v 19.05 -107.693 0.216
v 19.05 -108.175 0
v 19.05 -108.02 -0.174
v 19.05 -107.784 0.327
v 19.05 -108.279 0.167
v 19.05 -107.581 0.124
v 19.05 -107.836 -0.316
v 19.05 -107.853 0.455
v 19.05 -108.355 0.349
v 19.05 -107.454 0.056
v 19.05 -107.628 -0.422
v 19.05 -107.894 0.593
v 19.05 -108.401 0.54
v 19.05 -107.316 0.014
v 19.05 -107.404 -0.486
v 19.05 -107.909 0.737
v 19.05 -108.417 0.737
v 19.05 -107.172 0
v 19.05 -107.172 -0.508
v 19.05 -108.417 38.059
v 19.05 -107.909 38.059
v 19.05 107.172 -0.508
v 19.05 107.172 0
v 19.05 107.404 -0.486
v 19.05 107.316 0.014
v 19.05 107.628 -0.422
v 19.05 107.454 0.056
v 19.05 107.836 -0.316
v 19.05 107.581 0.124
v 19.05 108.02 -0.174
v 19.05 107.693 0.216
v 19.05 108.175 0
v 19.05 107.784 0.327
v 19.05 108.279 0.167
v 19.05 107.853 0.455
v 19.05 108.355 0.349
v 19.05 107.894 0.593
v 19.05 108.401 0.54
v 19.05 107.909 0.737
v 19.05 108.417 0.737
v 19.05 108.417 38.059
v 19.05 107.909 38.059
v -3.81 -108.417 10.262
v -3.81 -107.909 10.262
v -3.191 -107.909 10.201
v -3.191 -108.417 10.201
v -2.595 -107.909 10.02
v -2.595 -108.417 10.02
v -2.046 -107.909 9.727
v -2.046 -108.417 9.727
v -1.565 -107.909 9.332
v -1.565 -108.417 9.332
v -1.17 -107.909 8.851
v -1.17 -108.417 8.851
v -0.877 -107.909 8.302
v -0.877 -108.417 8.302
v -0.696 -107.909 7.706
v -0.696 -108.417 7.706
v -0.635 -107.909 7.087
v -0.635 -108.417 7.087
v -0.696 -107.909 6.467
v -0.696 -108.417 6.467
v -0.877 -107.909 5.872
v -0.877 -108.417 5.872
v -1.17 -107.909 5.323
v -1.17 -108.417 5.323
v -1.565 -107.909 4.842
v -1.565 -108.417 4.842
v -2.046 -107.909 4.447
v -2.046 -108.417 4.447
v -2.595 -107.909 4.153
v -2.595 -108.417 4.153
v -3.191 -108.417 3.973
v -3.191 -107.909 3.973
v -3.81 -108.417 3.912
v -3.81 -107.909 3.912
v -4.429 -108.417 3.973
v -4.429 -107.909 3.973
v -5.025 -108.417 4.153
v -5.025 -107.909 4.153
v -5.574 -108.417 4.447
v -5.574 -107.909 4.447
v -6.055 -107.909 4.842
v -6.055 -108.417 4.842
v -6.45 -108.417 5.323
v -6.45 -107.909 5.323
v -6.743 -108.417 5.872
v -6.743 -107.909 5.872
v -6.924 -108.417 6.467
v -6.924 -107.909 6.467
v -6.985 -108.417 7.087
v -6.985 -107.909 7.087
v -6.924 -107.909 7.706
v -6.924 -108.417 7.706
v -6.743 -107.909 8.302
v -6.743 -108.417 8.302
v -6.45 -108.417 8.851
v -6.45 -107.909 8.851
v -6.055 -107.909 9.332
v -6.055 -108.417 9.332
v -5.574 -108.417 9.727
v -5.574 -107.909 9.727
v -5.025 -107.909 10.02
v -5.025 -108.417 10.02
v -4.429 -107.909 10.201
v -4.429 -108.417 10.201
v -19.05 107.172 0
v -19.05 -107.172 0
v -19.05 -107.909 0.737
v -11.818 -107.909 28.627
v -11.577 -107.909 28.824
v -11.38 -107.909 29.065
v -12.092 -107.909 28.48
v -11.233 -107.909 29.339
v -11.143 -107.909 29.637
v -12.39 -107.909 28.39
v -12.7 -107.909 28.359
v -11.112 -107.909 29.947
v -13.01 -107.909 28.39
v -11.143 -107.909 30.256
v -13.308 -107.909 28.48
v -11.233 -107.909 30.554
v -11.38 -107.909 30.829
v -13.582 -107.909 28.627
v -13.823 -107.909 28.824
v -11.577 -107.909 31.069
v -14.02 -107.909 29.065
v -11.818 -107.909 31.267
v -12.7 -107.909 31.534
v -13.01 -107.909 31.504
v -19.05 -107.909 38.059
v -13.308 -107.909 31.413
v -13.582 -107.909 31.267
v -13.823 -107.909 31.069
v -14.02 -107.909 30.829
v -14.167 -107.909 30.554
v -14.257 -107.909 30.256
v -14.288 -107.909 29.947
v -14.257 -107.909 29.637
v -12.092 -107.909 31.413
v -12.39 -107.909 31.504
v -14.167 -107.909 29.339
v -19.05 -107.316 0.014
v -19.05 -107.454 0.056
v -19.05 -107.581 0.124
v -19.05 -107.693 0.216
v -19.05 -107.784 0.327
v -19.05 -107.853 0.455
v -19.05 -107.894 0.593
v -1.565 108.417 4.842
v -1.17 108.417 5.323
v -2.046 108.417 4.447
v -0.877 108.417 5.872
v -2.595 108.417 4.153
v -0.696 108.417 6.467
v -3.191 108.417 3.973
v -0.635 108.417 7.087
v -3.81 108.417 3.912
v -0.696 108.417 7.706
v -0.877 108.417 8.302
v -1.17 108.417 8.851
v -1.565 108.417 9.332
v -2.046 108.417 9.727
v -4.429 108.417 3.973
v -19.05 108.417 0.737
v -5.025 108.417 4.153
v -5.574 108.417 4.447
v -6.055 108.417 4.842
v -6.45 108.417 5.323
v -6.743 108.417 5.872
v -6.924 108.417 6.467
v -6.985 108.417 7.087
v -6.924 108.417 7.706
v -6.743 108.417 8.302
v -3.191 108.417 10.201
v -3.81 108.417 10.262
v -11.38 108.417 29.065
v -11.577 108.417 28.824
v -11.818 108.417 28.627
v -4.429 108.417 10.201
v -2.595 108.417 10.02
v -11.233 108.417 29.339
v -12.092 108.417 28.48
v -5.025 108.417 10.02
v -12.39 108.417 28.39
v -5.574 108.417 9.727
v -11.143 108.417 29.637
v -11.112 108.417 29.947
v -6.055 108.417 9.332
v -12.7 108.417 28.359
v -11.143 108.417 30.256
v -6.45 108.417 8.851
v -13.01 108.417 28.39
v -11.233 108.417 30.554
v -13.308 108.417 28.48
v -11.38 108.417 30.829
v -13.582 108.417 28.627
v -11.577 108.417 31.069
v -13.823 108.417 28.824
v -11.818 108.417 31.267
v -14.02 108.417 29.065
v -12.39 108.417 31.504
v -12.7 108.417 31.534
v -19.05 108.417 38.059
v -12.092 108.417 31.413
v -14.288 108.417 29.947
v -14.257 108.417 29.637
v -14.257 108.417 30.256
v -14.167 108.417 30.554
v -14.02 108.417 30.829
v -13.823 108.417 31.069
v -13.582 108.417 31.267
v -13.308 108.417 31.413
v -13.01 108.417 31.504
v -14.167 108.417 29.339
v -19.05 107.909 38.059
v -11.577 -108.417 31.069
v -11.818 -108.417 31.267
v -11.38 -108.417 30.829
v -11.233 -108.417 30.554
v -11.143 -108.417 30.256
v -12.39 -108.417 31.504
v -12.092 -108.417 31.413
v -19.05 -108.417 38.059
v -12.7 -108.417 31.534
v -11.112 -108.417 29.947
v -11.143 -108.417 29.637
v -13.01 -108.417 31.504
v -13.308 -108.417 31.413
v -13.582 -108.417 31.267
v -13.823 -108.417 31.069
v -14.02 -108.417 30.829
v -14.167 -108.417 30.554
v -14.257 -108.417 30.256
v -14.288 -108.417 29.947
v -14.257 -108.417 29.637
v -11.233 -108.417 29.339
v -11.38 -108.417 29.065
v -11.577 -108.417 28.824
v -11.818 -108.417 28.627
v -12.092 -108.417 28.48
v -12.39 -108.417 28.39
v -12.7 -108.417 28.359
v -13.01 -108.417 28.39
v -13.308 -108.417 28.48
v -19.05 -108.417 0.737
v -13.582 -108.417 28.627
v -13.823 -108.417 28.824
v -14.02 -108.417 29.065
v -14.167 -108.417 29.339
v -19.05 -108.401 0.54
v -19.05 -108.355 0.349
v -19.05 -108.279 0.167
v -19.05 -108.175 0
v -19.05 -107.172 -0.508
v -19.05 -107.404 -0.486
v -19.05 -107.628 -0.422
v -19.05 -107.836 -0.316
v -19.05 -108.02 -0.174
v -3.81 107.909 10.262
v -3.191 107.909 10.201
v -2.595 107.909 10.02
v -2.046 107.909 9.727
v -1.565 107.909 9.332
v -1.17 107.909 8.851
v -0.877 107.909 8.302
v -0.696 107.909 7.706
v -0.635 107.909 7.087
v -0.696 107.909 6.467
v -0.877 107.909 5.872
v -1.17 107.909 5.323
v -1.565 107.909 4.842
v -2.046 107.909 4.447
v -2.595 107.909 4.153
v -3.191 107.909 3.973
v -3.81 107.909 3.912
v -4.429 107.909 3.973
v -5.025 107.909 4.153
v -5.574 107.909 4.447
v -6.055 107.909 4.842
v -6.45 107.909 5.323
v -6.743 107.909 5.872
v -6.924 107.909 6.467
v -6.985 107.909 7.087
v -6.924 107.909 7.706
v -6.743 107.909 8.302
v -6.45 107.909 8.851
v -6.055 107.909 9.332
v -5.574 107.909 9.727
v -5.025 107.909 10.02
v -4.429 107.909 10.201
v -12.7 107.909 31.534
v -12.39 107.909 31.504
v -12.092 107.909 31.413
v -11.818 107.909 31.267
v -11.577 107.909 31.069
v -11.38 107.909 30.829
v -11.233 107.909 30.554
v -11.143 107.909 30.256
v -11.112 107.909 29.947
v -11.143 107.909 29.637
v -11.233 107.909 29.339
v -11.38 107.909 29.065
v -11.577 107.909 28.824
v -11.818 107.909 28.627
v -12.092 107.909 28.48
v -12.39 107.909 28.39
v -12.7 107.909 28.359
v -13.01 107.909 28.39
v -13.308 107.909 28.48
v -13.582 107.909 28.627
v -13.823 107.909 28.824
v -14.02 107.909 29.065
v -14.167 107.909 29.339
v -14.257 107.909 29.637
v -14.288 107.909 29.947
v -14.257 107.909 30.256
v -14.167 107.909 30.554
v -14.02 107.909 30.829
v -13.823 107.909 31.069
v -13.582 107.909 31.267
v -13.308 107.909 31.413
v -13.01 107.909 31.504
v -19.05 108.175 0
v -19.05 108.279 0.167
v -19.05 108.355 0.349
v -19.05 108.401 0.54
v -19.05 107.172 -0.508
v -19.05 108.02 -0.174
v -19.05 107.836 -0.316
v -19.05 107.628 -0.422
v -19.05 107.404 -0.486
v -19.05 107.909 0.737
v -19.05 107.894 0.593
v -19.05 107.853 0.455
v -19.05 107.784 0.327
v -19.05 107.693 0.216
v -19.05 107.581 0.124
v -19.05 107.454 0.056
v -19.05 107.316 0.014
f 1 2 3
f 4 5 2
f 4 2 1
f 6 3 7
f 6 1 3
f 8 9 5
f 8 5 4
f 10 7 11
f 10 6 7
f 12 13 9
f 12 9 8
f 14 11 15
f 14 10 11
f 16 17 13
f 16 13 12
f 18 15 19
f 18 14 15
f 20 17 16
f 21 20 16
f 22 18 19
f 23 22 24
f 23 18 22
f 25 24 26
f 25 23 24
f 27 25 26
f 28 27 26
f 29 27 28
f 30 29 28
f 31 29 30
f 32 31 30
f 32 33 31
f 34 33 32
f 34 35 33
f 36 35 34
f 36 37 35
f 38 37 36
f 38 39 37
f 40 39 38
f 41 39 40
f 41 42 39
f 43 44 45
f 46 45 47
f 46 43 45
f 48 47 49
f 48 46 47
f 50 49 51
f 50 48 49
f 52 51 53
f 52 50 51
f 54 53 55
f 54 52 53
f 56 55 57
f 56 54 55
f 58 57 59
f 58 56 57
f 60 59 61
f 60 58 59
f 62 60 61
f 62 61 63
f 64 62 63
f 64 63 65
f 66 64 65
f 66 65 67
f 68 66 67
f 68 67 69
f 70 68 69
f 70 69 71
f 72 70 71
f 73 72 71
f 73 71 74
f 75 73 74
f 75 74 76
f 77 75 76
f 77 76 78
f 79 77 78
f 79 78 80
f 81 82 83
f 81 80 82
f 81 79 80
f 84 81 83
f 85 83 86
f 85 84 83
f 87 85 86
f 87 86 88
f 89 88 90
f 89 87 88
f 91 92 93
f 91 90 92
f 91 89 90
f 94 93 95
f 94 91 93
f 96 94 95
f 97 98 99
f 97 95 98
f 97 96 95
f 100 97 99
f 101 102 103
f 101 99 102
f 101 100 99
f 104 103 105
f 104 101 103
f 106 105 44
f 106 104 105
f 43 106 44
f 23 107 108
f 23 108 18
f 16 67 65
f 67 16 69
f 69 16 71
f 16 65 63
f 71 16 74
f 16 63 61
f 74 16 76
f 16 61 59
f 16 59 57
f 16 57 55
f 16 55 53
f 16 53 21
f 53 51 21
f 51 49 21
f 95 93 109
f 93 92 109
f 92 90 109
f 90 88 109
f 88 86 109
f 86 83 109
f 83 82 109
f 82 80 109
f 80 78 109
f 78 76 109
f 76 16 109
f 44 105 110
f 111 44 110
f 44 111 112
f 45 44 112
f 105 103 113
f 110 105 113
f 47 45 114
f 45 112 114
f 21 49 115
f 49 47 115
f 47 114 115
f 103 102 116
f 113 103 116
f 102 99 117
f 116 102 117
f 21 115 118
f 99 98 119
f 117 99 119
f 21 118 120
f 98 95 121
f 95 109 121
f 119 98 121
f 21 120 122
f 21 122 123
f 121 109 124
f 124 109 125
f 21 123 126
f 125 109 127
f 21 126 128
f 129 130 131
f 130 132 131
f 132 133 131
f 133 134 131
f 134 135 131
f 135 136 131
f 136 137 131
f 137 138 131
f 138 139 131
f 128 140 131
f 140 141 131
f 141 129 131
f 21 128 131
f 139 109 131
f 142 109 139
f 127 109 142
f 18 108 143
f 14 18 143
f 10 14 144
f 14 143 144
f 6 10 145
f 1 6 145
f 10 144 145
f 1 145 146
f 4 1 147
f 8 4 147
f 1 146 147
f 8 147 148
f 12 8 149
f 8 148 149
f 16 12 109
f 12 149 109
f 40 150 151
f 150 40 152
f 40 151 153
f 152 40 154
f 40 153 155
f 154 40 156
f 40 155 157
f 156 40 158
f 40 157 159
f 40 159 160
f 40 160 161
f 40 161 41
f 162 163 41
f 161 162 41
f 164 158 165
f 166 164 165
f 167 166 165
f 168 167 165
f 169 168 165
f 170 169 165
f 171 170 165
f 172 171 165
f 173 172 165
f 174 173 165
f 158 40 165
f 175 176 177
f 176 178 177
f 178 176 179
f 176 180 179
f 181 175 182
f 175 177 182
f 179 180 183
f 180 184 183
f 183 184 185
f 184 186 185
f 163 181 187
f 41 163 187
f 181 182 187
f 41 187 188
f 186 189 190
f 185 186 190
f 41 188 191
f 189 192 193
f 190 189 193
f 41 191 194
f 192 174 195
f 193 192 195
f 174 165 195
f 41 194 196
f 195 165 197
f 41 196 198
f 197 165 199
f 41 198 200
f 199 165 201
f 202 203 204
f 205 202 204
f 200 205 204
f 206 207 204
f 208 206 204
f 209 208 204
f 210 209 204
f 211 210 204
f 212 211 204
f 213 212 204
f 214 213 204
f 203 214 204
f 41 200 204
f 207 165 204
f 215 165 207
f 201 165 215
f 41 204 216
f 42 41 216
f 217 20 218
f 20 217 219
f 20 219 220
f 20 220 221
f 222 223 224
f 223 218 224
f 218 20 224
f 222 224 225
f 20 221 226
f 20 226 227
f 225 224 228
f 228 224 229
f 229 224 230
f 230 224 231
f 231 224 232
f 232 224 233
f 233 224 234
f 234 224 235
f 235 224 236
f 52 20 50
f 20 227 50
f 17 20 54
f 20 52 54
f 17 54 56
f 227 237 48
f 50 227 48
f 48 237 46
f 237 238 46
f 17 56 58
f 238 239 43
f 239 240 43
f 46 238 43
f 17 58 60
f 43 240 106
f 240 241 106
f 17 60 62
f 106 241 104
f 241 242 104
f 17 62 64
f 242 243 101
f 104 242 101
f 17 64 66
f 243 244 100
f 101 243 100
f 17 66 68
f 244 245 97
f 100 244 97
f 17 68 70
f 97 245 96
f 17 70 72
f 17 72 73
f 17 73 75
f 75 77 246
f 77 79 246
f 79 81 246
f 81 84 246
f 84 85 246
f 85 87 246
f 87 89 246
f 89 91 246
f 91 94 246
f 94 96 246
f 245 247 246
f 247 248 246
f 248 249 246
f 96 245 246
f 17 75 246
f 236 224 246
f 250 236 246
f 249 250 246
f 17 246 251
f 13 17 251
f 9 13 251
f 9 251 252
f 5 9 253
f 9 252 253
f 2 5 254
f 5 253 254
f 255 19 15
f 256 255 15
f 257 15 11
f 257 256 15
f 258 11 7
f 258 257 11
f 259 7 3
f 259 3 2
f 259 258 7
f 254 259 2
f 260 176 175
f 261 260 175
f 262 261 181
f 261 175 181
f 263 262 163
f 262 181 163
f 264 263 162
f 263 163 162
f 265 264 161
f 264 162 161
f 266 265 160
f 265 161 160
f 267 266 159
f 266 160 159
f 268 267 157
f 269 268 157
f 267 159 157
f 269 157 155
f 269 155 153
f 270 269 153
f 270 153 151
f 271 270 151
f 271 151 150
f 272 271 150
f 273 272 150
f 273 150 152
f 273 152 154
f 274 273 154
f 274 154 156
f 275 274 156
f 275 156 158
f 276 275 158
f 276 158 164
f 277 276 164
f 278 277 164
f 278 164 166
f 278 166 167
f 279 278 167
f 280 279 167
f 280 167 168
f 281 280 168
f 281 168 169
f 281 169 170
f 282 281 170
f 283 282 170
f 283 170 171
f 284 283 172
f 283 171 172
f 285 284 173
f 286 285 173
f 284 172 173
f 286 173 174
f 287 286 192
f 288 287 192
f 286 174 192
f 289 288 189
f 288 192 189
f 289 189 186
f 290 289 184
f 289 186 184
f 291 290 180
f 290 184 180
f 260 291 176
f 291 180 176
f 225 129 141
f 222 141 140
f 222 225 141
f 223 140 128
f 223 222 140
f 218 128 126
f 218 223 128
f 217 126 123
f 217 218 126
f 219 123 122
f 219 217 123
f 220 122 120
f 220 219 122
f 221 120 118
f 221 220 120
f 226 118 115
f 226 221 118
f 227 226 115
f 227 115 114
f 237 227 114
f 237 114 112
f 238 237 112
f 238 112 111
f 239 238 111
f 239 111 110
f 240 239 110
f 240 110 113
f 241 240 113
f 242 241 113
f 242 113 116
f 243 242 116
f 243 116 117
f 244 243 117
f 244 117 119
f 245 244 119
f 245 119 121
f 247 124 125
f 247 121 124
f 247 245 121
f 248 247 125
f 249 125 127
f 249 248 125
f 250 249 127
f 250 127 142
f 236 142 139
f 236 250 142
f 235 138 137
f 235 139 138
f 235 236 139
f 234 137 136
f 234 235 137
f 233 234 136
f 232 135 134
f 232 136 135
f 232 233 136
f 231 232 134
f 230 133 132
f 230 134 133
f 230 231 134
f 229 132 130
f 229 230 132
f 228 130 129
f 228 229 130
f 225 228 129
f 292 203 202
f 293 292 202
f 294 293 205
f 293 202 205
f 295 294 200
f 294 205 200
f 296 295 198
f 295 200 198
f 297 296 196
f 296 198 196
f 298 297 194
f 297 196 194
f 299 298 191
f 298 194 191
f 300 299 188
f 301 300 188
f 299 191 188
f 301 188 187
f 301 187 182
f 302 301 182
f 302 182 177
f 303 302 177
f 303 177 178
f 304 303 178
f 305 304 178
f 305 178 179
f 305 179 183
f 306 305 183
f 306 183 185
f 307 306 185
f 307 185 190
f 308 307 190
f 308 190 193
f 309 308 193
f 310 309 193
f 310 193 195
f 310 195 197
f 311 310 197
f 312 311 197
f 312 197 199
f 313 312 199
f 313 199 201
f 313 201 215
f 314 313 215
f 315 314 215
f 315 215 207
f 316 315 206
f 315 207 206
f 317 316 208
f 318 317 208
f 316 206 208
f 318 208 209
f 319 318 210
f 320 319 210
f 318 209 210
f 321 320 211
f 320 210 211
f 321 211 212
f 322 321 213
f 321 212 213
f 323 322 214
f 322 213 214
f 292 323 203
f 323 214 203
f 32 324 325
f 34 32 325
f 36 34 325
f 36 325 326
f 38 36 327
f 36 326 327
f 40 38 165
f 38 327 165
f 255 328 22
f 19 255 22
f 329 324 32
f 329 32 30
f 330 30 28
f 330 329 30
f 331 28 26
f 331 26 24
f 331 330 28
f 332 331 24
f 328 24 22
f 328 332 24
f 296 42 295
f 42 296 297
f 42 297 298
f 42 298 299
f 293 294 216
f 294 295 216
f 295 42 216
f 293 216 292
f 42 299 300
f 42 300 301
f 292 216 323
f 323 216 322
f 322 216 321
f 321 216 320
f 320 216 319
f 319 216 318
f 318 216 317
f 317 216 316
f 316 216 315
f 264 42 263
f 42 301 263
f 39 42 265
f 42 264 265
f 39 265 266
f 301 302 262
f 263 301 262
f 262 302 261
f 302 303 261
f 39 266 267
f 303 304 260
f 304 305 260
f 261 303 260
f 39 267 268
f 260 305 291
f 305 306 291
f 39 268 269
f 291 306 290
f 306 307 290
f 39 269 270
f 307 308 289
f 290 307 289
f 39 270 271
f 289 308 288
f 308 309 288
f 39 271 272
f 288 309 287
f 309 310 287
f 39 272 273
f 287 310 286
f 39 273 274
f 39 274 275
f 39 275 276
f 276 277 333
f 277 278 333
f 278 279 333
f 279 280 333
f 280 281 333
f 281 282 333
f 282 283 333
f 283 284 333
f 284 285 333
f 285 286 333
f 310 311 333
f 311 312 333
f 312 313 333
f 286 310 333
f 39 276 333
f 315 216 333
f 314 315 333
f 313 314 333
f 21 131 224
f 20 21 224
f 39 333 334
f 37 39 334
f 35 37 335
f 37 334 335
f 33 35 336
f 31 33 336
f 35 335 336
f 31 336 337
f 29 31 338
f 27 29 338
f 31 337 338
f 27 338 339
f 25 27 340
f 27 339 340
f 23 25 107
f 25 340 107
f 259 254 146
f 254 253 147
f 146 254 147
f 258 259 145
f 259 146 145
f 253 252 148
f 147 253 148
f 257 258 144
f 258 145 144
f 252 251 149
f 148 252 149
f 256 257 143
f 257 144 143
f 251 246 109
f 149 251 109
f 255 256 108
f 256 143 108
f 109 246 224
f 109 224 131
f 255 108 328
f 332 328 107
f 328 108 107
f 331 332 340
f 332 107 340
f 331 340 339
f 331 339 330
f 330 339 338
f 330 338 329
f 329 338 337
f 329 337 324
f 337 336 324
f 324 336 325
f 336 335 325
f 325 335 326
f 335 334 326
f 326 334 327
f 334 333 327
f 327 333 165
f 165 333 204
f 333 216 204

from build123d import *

# Parameters (mm, degrees)
SKETCH1_W                        = 38.1
SKETCH1_H                        = 292.1
BASE_FLANGE1_DEPTH               = 0.508
SKETCHED_START                   = -19.05
SKETCHED_BEND5_DEPTH             = 38.1
SKETCHED_BEND5_2_DEPTH           = 38.1
SKETCHED_BEND8_DEPTH             = 38.1
SKETCHED_BEND8_2_DEPTH           = 38.1
F_1_4_0_25_DIAMETER_HOLE4_D      = 6.35
F_1_4_0_25_DIAMETER_HOLE4_DEPTH  = 0.508
F_1_8_0_125_DIAMETER_HOLE1_D     = 3.175
F_1_8_0_125_DIAMETER_HOLE1_DEPTH = 0.508


# Read off the part's stored shape, not the designer's step: Sketched Bend5, Sketched Bend8
# Sheet-metal steps are written as plain solids
with BuildPart() as part:
    # Sketch1 → Base-Flange1 (new body)
    with BuildSketch(Plane.XY):
        Rectangle(SKETCH1_W, SKETCH1_H)
    extrude(amount=-BASE_FLANGE1_DEPTH)

    # Sketched Bend5 outline → Sketched Bend5 (cut)
    with BuildSketch(Plane.YZ.offset(SKETCHED_START)):
        with BuildLine():
            Line((146.05, 0), (108.175204196, 0))
            ThreePointArc((108.175204196, 0), (107.734237547, -0.373760644), (107.171984579, -0.508))
            Line((107.171984579, -0.508), (146.05, -0.508))
            Line((146.05, -0.508), (146.05, 0))
        make_face()
    extrude(amount=SKETCHED_BEND5_DEPTH, mode=Mode.SUBTRACT)

    # Sketched Bend5 2 outline → Sketched Bend5 2 (add)
    with BuildSketch(Plane.YZ.offset(SKETCHED_START)):
        with BuildLine():
            ThreePointArc((108.175204196, 0), (108.354701007, 0.349029345), (108.416584579, 0.7366))
            Line((108.416584579, 0.7366), (108.416584579, 38.058584579))
            Line((108.416584579, 38.058584579), (107.908584579, 38.058584579))
            Line((107.908584579, 38.058584579), (107.908584579, 0.7366))
            ThreePointArc((107.908584579, 0.7366), (107.692839434, 0.215745145), (107.171984579, 0))
            Line((107.171984579, 0), (108.175204196, 0))
        make_face()
    extrude(amount=SKETCHED_BEND5_2_DEPTH)

    # Sketched Bend8 outline → Sketched Bend8 (cut)
    with BuildSketch(Plane.YZ.offset(SKETCHED_START)):
        with BuildLine():
            ThreePointArc((-107.171984579, -0.508), (-107.734237547, -0.373760644), (-108.175204196, 0))
            Line((-108.175204196, 0), (-146.05, 0))
            Line((-146.05, 0), (-146.05, -0.508))
            Line((-146.05, -0.508), (-107.171984579, -0.508))
        make_face()
    extrude(amount=SKETCHED_BEND8_DEPTH, mode=Mode.SUBTRACT)

    # Sketched Bend8 2 outline → Sketched Bend8 2 (add)
    with BuildSketch(Plane.YZ.offset(SKETCHED_START)):
        with BuildLine():
            Line((-107.908584579, 0.7366), (-107.908584579, 38.058584579))
            Line((-107.908584579, 38.058584579), (-108.416584579, 38.058584579))
            Line((-108.416584579, 38.058584579), (-108.416584579, 0.7366))
            ThreePointArc((-108.416584579, 0.7366), (-108.354701007, 0.349029345), (-108.175204196, 0))
            Line((-108.175204196, 0), (-107.171984579, 0))
            ThreePointArc((-107.171984579, 0), (-107.692839434, 0.215745145), (-107.908584579, 0.7366))
        make_face()
    extrude(amount=SKETCHED_BEND8_2_DEPTH)

    # 1/4 (0.25) Diameter Hole4
    with Locations(Plane(origin=(-3.81, 107.908584579, 7.0866), x_dir=(0, 0, -1), z_dir=(0, -1, 0))):
        with Locations((0, 0)):
            f_1_4_0_25_diameter_hole4 = Hole(F_1_4_0_25_DIAMETER_HOLE4_D / 2, depth=F_1_4_0_25_DIAMETER_HOLE4_DEPTH)

    # 1/8 (0.125) Diameter Hole1
    with Locations(Plane(origin=(-12.7, 107.908584579, 29.9466), x_dir=(0, 0, -1), z_dir=(0, -1, 0))):
        with Locations((0, 0)):
            f_1_8_0_125_diameter_hole1 = Hole(F_1_8_0_125_DIAMETER_HOLE1_D / 2, depth=F_1_8_0_125_DIAMETER_HOLE1_DEPTH)

    # Mirror1: 1/4 (0.25) Diameter Hole4, 1/8 (0.125) Diameter Hole1 across plane
    add(f_1_4_0_25_diameter_hole4.mirror(Plane.ZX), mode=Mode.SUBTRACT)
    add(f_1_8_0_125_diameter_hole1.mirror(Plane.ZX), mode=Mode.SUBTRACT)


solid = part.part
